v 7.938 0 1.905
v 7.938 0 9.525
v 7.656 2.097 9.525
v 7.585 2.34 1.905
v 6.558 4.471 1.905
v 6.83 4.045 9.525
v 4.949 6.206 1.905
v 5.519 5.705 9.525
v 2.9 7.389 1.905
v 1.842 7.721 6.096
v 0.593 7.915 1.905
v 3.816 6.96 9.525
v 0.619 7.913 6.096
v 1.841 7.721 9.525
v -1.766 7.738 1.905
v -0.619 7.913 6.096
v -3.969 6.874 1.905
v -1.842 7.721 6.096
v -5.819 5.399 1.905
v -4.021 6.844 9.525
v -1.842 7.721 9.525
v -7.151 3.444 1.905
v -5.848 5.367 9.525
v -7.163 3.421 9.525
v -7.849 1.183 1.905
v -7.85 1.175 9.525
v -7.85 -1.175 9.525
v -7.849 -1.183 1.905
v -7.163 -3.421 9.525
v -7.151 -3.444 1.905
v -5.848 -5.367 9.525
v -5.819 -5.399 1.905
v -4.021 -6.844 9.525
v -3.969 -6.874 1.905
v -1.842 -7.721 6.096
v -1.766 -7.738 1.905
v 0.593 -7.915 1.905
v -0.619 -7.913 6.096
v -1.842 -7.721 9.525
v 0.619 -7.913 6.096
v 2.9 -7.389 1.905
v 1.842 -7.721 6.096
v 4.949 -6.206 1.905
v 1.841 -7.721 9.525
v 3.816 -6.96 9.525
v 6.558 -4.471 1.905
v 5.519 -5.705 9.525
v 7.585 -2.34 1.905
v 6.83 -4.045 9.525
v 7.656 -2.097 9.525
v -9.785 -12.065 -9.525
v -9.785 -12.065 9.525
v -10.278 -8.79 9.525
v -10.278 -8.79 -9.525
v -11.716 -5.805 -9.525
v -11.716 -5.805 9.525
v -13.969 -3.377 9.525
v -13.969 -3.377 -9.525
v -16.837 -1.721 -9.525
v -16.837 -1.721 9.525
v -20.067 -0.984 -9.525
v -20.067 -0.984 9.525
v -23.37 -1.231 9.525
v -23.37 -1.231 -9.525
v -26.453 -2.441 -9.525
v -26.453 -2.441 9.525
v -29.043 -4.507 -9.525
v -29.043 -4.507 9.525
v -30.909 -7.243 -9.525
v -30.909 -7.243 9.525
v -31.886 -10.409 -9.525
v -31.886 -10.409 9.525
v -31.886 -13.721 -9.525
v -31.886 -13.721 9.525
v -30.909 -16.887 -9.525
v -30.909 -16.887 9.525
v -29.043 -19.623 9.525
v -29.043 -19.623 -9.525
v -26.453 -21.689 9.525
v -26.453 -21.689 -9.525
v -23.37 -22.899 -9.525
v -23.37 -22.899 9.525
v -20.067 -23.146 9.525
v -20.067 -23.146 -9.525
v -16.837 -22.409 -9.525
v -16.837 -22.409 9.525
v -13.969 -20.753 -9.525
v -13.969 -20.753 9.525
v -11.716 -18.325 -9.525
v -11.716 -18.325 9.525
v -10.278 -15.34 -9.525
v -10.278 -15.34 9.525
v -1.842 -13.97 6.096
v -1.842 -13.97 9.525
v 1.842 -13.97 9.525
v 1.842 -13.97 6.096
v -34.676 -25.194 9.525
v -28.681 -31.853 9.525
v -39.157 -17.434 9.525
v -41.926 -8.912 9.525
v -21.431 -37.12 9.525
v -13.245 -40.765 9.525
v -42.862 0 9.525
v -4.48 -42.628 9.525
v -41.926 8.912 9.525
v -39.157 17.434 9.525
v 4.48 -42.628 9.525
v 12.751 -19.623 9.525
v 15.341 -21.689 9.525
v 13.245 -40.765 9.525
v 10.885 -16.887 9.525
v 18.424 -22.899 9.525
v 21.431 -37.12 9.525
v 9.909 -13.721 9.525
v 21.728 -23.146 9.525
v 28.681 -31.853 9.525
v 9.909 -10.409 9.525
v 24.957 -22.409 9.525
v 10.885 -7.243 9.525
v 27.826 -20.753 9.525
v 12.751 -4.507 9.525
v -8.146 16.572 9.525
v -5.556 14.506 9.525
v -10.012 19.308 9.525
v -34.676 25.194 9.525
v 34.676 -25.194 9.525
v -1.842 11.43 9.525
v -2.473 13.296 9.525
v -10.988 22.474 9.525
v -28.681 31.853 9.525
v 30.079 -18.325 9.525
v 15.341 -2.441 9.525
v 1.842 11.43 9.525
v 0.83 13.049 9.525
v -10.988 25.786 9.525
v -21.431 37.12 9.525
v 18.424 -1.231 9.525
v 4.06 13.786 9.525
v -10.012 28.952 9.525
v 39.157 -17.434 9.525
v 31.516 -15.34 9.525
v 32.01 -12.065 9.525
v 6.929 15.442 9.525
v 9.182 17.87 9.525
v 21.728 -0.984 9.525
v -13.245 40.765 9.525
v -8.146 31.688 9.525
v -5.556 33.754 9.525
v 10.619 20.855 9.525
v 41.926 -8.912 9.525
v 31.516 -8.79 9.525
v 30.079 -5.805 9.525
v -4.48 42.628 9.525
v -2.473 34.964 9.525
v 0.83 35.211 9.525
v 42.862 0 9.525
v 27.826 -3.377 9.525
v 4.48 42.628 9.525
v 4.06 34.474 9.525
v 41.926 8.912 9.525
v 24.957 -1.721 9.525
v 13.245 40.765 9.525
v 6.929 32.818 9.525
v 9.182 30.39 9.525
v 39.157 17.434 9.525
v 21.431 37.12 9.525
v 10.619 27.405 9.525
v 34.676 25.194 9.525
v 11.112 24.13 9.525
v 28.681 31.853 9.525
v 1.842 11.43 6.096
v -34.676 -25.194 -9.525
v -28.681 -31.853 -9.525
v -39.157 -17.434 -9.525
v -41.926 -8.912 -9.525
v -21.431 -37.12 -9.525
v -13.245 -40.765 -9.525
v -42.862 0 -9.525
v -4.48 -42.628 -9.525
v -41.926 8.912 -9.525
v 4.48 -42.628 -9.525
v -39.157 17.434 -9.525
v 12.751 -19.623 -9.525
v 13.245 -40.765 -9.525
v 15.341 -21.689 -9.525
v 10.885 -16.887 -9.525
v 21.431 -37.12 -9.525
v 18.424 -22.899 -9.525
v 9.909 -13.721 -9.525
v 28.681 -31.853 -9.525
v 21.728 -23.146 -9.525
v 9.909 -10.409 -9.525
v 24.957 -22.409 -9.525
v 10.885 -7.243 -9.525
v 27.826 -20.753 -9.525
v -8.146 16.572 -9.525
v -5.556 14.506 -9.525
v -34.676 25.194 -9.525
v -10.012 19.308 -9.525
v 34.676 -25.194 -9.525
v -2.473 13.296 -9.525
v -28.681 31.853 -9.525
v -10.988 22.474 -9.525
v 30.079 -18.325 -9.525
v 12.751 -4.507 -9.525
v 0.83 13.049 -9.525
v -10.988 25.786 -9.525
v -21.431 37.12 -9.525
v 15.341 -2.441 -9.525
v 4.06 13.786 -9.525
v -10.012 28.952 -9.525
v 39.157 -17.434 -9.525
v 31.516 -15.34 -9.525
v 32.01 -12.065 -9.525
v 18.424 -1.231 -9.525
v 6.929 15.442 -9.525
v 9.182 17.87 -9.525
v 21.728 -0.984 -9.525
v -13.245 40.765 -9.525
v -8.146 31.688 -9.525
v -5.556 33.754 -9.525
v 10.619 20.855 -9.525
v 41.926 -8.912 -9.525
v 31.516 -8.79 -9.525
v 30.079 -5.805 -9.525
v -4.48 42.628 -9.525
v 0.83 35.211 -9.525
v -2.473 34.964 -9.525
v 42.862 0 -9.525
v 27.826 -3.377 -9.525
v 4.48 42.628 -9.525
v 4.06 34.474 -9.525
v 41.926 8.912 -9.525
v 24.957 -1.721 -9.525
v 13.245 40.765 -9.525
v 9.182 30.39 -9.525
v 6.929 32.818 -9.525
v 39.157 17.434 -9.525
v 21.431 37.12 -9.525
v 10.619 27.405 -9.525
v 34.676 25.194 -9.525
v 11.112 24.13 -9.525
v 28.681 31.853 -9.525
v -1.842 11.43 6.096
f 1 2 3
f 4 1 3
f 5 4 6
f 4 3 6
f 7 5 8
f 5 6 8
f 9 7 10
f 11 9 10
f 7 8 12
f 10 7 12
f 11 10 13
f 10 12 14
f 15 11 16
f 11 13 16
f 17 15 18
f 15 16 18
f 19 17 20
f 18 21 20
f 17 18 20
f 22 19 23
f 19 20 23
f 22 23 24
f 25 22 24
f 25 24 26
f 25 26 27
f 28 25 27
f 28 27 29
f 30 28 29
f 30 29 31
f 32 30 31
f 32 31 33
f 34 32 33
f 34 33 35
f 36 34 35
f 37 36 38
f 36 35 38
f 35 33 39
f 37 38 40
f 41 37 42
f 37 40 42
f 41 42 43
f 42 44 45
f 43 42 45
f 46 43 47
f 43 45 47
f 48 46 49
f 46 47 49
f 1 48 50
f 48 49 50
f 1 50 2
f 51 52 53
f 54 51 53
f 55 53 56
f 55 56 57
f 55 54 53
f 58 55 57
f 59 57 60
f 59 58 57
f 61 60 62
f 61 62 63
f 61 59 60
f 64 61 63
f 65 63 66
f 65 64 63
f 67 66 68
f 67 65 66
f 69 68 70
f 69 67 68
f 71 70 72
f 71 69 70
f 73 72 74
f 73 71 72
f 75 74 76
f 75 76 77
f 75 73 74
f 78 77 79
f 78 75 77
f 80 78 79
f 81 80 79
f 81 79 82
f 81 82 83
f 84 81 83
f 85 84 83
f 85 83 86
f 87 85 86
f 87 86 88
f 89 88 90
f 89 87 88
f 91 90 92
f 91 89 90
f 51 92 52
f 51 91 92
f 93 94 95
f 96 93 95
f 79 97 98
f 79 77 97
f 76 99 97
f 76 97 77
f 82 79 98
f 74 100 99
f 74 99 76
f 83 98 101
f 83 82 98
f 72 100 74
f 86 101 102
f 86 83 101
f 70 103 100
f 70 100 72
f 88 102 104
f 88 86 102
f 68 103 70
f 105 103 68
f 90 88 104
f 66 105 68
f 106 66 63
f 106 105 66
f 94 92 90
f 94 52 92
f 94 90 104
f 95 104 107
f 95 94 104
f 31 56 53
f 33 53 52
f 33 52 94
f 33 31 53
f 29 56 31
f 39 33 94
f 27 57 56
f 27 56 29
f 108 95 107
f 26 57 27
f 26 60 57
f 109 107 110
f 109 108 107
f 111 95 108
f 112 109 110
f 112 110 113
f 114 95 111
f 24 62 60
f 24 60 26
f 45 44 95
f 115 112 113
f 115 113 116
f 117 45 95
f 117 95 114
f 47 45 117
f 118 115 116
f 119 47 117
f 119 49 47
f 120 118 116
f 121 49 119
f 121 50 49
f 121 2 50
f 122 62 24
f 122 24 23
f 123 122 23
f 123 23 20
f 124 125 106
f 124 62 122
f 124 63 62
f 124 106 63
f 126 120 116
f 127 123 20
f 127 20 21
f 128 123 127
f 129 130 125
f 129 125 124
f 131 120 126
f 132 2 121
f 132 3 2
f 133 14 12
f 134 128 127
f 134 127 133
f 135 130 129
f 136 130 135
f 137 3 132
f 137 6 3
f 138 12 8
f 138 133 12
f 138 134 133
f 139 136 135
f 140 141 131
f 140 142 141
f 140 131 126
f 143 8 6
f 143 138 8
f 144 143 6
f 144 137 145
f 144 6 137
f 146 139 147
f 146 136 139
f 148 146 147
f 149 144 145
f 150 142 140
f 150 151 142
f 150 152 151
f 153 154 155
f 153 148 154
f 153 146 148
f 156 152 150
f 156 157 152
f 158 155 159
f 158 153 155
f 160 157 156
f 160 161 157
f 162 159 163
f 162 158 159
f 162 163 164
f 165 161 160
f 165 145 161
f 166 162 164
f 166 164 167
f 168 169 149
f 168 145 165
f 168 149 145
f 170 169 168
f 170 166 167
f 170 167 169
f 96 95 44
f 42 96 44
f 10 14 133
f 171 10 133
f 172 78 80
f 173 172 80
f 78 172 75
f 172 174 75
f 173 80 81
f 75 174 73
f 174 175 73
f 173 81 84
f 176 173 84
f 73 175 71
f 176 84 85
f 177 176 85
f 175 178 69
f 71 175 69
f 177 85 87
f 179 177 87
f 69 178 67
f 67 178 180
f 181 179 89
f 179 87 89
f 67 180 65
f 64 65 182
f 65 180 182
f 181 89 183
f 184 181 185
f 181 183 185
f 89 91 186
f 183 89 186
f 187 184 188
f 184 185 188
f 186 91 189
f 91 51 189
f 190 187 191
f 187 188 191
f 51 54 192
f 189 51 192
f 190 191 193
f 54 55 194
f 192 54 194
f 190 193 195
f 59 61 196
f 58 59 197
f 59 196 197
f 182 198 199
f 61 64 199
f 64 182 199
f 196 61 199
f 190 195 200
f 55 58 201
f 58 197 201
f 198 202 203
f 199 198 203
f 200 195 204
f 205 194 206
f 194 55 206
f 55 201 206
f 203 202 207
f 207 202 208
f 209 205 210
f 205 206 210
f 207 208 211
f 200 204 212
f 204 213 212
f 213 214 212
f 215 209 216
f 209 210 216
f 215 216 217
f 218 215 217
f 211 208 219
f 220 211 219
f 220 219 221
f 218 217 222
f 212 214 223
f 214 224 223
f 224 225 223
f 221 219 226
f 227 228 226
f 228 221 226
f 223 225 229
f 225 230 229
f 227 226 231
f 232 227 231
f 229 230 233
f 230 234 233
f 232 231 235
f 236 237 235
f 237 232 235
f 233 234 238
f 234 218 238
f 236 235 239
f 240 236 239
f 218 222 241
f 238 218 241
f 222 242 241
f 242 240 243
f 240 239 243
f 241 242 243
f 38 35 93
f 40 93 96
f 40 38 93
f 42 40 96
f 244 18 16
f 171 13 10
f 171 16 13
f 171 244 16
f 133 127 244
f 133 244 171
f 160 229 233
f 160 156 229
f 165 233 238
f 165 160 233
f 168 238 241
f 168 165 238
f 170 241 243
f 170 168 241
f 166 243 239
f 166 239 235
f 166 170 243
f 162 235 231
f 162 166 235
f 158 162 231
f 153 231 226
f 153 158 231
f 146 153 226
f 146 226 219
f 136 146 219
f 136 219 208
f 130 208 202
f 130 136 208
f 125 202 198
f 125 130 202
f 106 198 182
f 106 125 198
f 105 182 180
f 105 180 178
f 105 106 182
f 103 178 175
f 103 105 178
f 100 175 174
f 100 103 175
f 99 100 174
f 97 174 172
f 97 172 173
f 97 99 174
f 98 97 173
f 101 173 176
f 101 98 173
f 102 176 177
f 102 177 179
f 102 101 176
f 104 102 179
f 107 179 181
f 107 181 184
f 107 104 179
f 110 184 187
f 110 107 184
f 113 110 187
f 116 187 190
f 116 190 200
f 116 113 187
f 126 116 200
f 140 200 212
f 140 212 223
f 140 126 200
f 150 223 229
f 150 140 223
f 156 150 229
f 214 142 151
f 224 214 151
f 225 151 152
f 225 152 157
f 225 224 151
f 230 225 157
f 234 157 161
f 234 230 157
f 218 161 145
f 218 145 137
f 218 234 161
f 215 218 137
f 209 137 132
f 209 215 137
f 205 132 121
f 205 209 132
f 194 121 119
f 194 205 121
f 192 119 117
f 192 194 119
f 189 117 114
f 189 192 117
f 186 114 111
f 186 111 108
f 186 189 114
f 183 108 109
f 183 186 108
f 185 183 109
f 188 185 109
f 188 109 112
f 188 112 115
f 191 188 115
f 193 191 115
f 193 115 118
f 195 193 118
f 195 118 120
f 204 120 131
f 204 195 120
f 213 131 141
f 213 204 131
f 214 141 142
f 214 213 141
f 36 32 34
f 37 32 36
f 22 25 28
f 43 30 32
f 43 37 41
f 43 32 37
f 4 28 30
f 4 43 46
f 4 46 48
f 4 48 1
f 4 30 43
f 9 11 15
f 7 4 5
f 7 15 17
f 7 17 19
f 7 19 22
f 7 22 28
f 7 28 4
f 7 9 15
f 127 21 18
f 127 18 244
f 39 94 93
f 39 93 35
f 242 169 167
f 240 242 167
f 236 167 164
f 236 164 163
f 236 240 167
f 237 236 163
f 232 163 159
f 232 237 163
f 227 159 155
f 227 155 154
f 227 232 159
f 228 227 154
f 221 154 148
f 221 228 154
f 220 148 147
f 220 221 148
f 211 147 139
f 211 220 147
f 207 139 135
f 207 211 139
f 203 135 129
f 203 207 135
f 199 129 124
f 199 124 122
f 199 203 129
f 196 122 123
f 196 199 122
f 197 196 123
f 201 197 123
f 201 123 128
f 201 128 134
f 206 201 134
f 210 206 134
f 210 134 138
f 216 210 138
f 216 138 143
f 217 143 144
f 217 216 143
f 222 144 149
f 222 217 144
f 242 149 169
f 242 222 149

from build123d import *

# Parameters (mm, degrees)
SKETCH1_R           = 42.8625
SKETCH1_R_2         = 11.1125
BOSS_EXTRUDE1_DEPTH = 9.525
SKETCH2_R           = 7.9375
CUT_EXTRUDE1_DEPTH  = 7.62
SKETCH3_W           = 3.683
SKETCH3_H           = 25.4
CUT_EXTRUDE2_DEPTH  = 3.429


with BuildPart() as part:
    # Sketch1 → Boss-Extrude1 (new body, symmetric)
    with BuildSketch(Plane.XY):
        Circle(SKETCH1_R)
        with Locations((0, 24.13)):
            Circle(SKETCH1_R_2, mode=Mode.SUBTRACT)
        with Locations((-20.897192993, -12.065)):
            Circle(SKETCH1_R_2, mode=Mode.SUBTRACT)
        with Locations((20.897192993, -12.065)):
            Circle(SKETCH1_R_2, mode=Mode.SUBTRACT)
    extrude(amount=BOSS_EXTRUDE1_DEPTH, both=True)

    # Sketch2 → Cut-Extrude1 (cut)
    with BuildSketch(Plane.XY.offset(9.525)):
        Circle(SKETCH2_R)
    extrude(amount=-CUT_EXTRUDE1_DEPTH, mode=Mode.SUBTRACT)

    # Sketch3 → Cut-Extrude2 (cut)
    with BuildSketch(Plane.XY.offset(9.525)):
        with Locations((0, -1.27)):
            Rectangle(SKETCH3_W, SKETCH3_H)
    extrude(amount=-CUT_EXTRUDE2_DEPTH, mode=Mode.SUBTRACT)


solid = part.part
